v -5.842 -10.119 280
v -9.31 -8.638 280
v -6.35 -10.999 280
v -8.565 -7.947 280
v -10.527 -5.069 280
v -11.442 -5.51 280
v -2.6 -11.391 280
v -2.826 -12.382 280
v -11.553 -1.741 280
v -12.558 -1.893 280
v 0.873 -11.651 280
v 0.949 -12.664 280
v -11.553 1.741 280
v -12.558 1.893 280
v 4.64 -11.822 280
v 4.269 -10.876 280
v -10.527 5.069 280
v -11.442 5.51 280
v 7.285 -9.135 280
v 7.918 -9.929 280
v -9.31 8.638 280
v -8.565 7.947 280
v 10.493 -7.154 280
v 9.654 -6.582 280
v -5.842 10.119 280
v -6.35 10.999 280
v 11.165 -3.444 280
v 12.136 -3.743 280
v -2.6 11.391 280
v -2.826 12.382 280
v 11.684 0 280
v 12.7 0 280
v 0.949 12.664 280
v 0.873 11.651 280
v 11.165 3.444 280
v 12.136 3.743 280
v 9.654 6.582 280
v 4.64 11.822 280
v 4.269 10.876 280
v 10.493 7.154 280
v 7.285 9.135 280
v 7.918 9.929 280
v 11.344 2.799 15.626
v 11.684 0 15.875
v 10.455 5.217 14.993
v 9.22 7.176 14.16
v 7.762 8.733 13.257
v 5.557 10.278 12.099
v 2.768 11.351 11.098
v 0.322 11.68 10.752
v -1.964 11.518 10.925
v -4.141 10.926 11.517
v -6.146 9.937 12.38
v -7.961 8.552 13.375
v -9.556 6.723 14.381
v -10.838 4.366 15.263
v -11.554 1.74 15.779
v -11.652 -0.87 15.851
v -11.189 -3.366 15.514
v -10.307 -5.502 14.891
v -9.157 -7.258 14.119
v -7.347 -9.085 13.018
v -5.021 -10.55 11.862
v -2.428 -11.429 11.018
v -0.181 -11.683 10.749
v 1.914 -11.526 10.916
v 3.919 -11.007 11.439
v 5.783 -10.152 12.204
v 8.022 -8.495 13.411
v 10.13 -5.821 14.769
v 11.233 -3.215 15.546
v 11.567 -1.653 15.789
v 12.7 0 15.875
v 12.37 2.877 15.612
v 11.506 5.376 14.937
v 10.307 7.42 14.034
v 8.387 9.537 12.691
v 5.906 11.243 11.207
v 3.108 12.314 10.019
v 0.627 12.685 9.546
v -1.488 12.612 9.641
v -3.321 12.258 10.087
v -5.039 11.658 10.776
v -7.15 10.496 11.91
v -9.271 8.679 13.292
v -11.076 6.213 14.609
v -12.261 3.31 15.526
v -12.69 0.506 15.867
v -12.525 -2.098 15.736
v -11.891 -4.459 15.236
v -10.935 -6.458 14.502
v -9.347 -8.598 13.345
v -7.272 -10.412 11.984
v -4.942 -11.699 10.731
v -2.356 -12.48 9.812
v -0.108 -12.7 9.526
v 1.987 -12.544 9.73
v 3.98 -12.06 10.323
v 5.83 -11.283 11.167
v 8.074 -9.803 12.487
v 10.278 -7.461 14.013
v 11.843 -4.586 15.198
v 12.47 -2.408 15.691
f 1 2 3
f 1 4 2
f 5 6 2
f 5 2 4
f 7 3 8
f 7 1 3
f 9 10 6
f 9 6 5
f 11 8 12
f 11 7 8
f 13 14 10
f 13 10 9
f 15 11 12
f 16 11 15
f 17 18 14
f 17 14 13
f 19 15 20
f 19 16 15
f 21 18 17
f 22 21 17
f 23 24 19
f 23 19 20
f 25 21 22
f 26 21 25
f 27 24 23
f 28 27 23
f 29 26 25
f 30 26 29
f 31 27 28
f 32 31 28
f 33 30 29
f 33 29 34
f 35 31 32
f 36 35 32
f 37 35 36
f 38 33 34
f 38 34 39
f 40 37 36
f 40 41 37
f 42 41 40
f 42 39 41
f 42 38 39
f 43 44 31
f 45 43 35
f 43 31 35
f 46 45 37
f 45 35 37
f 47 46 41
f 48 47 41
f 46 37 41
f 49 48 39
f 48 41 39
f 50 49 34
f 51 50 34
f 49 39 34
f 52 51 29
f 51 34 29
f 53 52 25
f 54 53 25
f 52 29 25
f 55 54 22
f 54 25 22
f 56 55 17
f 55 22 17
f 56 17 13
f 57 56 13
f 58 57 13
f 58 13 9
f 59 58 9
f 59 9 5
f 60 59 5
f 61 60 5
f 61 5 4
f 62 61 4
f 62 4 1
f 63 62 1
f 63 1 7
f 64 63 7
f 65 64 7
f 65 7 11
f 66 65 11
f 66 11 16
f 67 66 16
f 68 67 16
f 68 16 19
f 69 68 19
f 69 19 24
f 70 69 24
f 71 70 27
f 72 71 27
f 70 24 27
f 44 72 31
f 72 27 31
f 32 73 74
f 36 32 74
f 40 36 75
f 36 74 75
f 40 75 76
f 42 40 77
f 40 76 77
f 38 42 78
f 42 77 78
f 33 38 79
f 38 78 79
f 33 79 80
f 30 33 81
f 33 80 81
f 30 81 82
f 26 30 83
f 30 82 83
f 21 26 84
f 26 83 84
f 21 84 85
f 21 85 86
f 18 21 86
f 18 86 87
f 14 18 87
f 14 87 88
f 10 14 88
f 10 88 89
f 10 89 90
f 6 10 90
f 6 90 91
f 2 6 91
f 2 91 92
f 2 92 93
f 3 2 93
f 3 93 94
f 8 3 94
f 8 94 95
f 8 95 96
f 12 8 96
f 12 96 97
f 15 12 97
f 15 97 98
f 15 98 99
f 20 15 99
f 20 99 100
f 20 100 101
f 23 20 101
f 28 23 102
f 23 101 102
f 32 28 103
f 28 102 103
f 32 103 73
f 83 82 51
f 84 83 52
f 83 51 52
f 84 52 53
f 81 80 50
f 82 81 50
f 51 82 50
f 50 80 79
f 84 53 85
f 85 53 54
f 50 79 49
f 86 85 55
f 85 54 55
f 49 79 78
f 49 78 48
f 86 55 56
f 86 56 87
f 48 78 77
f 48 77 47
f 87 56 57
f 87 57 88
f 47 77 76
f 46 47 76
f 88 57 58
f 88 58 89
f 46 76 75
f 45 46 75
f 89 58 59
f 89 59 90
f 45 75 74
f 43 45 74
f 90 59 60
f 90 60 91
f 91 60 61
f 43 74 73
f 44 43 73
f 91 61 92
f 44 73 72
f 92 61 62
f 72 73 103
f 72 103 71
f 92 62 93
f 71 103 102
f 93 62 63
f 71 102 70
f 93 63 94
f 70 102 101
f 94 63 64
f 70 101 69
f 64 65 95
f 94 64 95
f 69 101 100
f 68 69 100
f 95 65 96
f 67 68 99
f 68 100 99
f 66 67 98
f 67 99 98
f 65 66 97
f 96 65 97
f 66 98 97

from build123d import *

# Parameters (mm, degrees)
F0_R     = 12.7
F1_DEPTH = 280
F2_R     = 15.875
F3_DEPTH = 50
F4_R     = 11.684
F5_DEPTH = 270.476


with BuildPart() as f1:
    # F0 (on Top) → F1 (new body)
    with BuildSketch(Plane.XY):
        Circle(F0_R)
    extrude(amount=F1_DEPTH)

    # F2 (on Right) → F3 (cut, symmetric)
    with BuildSketch(Plane.YZ):
        Circle(F2_R)
    extrude(amount=F3_DEPTH, both=True, mode=Mode.SUBTRACT)

    # F4 (on face) → F5 (cut, through all)
    with BuildSketch(Plane.XY.offset(280)):
        Circle(F4_R)
    extrude(amount=-F5_DEPTH, mode=Mode.SUBTRACT)


solid = f1.part
